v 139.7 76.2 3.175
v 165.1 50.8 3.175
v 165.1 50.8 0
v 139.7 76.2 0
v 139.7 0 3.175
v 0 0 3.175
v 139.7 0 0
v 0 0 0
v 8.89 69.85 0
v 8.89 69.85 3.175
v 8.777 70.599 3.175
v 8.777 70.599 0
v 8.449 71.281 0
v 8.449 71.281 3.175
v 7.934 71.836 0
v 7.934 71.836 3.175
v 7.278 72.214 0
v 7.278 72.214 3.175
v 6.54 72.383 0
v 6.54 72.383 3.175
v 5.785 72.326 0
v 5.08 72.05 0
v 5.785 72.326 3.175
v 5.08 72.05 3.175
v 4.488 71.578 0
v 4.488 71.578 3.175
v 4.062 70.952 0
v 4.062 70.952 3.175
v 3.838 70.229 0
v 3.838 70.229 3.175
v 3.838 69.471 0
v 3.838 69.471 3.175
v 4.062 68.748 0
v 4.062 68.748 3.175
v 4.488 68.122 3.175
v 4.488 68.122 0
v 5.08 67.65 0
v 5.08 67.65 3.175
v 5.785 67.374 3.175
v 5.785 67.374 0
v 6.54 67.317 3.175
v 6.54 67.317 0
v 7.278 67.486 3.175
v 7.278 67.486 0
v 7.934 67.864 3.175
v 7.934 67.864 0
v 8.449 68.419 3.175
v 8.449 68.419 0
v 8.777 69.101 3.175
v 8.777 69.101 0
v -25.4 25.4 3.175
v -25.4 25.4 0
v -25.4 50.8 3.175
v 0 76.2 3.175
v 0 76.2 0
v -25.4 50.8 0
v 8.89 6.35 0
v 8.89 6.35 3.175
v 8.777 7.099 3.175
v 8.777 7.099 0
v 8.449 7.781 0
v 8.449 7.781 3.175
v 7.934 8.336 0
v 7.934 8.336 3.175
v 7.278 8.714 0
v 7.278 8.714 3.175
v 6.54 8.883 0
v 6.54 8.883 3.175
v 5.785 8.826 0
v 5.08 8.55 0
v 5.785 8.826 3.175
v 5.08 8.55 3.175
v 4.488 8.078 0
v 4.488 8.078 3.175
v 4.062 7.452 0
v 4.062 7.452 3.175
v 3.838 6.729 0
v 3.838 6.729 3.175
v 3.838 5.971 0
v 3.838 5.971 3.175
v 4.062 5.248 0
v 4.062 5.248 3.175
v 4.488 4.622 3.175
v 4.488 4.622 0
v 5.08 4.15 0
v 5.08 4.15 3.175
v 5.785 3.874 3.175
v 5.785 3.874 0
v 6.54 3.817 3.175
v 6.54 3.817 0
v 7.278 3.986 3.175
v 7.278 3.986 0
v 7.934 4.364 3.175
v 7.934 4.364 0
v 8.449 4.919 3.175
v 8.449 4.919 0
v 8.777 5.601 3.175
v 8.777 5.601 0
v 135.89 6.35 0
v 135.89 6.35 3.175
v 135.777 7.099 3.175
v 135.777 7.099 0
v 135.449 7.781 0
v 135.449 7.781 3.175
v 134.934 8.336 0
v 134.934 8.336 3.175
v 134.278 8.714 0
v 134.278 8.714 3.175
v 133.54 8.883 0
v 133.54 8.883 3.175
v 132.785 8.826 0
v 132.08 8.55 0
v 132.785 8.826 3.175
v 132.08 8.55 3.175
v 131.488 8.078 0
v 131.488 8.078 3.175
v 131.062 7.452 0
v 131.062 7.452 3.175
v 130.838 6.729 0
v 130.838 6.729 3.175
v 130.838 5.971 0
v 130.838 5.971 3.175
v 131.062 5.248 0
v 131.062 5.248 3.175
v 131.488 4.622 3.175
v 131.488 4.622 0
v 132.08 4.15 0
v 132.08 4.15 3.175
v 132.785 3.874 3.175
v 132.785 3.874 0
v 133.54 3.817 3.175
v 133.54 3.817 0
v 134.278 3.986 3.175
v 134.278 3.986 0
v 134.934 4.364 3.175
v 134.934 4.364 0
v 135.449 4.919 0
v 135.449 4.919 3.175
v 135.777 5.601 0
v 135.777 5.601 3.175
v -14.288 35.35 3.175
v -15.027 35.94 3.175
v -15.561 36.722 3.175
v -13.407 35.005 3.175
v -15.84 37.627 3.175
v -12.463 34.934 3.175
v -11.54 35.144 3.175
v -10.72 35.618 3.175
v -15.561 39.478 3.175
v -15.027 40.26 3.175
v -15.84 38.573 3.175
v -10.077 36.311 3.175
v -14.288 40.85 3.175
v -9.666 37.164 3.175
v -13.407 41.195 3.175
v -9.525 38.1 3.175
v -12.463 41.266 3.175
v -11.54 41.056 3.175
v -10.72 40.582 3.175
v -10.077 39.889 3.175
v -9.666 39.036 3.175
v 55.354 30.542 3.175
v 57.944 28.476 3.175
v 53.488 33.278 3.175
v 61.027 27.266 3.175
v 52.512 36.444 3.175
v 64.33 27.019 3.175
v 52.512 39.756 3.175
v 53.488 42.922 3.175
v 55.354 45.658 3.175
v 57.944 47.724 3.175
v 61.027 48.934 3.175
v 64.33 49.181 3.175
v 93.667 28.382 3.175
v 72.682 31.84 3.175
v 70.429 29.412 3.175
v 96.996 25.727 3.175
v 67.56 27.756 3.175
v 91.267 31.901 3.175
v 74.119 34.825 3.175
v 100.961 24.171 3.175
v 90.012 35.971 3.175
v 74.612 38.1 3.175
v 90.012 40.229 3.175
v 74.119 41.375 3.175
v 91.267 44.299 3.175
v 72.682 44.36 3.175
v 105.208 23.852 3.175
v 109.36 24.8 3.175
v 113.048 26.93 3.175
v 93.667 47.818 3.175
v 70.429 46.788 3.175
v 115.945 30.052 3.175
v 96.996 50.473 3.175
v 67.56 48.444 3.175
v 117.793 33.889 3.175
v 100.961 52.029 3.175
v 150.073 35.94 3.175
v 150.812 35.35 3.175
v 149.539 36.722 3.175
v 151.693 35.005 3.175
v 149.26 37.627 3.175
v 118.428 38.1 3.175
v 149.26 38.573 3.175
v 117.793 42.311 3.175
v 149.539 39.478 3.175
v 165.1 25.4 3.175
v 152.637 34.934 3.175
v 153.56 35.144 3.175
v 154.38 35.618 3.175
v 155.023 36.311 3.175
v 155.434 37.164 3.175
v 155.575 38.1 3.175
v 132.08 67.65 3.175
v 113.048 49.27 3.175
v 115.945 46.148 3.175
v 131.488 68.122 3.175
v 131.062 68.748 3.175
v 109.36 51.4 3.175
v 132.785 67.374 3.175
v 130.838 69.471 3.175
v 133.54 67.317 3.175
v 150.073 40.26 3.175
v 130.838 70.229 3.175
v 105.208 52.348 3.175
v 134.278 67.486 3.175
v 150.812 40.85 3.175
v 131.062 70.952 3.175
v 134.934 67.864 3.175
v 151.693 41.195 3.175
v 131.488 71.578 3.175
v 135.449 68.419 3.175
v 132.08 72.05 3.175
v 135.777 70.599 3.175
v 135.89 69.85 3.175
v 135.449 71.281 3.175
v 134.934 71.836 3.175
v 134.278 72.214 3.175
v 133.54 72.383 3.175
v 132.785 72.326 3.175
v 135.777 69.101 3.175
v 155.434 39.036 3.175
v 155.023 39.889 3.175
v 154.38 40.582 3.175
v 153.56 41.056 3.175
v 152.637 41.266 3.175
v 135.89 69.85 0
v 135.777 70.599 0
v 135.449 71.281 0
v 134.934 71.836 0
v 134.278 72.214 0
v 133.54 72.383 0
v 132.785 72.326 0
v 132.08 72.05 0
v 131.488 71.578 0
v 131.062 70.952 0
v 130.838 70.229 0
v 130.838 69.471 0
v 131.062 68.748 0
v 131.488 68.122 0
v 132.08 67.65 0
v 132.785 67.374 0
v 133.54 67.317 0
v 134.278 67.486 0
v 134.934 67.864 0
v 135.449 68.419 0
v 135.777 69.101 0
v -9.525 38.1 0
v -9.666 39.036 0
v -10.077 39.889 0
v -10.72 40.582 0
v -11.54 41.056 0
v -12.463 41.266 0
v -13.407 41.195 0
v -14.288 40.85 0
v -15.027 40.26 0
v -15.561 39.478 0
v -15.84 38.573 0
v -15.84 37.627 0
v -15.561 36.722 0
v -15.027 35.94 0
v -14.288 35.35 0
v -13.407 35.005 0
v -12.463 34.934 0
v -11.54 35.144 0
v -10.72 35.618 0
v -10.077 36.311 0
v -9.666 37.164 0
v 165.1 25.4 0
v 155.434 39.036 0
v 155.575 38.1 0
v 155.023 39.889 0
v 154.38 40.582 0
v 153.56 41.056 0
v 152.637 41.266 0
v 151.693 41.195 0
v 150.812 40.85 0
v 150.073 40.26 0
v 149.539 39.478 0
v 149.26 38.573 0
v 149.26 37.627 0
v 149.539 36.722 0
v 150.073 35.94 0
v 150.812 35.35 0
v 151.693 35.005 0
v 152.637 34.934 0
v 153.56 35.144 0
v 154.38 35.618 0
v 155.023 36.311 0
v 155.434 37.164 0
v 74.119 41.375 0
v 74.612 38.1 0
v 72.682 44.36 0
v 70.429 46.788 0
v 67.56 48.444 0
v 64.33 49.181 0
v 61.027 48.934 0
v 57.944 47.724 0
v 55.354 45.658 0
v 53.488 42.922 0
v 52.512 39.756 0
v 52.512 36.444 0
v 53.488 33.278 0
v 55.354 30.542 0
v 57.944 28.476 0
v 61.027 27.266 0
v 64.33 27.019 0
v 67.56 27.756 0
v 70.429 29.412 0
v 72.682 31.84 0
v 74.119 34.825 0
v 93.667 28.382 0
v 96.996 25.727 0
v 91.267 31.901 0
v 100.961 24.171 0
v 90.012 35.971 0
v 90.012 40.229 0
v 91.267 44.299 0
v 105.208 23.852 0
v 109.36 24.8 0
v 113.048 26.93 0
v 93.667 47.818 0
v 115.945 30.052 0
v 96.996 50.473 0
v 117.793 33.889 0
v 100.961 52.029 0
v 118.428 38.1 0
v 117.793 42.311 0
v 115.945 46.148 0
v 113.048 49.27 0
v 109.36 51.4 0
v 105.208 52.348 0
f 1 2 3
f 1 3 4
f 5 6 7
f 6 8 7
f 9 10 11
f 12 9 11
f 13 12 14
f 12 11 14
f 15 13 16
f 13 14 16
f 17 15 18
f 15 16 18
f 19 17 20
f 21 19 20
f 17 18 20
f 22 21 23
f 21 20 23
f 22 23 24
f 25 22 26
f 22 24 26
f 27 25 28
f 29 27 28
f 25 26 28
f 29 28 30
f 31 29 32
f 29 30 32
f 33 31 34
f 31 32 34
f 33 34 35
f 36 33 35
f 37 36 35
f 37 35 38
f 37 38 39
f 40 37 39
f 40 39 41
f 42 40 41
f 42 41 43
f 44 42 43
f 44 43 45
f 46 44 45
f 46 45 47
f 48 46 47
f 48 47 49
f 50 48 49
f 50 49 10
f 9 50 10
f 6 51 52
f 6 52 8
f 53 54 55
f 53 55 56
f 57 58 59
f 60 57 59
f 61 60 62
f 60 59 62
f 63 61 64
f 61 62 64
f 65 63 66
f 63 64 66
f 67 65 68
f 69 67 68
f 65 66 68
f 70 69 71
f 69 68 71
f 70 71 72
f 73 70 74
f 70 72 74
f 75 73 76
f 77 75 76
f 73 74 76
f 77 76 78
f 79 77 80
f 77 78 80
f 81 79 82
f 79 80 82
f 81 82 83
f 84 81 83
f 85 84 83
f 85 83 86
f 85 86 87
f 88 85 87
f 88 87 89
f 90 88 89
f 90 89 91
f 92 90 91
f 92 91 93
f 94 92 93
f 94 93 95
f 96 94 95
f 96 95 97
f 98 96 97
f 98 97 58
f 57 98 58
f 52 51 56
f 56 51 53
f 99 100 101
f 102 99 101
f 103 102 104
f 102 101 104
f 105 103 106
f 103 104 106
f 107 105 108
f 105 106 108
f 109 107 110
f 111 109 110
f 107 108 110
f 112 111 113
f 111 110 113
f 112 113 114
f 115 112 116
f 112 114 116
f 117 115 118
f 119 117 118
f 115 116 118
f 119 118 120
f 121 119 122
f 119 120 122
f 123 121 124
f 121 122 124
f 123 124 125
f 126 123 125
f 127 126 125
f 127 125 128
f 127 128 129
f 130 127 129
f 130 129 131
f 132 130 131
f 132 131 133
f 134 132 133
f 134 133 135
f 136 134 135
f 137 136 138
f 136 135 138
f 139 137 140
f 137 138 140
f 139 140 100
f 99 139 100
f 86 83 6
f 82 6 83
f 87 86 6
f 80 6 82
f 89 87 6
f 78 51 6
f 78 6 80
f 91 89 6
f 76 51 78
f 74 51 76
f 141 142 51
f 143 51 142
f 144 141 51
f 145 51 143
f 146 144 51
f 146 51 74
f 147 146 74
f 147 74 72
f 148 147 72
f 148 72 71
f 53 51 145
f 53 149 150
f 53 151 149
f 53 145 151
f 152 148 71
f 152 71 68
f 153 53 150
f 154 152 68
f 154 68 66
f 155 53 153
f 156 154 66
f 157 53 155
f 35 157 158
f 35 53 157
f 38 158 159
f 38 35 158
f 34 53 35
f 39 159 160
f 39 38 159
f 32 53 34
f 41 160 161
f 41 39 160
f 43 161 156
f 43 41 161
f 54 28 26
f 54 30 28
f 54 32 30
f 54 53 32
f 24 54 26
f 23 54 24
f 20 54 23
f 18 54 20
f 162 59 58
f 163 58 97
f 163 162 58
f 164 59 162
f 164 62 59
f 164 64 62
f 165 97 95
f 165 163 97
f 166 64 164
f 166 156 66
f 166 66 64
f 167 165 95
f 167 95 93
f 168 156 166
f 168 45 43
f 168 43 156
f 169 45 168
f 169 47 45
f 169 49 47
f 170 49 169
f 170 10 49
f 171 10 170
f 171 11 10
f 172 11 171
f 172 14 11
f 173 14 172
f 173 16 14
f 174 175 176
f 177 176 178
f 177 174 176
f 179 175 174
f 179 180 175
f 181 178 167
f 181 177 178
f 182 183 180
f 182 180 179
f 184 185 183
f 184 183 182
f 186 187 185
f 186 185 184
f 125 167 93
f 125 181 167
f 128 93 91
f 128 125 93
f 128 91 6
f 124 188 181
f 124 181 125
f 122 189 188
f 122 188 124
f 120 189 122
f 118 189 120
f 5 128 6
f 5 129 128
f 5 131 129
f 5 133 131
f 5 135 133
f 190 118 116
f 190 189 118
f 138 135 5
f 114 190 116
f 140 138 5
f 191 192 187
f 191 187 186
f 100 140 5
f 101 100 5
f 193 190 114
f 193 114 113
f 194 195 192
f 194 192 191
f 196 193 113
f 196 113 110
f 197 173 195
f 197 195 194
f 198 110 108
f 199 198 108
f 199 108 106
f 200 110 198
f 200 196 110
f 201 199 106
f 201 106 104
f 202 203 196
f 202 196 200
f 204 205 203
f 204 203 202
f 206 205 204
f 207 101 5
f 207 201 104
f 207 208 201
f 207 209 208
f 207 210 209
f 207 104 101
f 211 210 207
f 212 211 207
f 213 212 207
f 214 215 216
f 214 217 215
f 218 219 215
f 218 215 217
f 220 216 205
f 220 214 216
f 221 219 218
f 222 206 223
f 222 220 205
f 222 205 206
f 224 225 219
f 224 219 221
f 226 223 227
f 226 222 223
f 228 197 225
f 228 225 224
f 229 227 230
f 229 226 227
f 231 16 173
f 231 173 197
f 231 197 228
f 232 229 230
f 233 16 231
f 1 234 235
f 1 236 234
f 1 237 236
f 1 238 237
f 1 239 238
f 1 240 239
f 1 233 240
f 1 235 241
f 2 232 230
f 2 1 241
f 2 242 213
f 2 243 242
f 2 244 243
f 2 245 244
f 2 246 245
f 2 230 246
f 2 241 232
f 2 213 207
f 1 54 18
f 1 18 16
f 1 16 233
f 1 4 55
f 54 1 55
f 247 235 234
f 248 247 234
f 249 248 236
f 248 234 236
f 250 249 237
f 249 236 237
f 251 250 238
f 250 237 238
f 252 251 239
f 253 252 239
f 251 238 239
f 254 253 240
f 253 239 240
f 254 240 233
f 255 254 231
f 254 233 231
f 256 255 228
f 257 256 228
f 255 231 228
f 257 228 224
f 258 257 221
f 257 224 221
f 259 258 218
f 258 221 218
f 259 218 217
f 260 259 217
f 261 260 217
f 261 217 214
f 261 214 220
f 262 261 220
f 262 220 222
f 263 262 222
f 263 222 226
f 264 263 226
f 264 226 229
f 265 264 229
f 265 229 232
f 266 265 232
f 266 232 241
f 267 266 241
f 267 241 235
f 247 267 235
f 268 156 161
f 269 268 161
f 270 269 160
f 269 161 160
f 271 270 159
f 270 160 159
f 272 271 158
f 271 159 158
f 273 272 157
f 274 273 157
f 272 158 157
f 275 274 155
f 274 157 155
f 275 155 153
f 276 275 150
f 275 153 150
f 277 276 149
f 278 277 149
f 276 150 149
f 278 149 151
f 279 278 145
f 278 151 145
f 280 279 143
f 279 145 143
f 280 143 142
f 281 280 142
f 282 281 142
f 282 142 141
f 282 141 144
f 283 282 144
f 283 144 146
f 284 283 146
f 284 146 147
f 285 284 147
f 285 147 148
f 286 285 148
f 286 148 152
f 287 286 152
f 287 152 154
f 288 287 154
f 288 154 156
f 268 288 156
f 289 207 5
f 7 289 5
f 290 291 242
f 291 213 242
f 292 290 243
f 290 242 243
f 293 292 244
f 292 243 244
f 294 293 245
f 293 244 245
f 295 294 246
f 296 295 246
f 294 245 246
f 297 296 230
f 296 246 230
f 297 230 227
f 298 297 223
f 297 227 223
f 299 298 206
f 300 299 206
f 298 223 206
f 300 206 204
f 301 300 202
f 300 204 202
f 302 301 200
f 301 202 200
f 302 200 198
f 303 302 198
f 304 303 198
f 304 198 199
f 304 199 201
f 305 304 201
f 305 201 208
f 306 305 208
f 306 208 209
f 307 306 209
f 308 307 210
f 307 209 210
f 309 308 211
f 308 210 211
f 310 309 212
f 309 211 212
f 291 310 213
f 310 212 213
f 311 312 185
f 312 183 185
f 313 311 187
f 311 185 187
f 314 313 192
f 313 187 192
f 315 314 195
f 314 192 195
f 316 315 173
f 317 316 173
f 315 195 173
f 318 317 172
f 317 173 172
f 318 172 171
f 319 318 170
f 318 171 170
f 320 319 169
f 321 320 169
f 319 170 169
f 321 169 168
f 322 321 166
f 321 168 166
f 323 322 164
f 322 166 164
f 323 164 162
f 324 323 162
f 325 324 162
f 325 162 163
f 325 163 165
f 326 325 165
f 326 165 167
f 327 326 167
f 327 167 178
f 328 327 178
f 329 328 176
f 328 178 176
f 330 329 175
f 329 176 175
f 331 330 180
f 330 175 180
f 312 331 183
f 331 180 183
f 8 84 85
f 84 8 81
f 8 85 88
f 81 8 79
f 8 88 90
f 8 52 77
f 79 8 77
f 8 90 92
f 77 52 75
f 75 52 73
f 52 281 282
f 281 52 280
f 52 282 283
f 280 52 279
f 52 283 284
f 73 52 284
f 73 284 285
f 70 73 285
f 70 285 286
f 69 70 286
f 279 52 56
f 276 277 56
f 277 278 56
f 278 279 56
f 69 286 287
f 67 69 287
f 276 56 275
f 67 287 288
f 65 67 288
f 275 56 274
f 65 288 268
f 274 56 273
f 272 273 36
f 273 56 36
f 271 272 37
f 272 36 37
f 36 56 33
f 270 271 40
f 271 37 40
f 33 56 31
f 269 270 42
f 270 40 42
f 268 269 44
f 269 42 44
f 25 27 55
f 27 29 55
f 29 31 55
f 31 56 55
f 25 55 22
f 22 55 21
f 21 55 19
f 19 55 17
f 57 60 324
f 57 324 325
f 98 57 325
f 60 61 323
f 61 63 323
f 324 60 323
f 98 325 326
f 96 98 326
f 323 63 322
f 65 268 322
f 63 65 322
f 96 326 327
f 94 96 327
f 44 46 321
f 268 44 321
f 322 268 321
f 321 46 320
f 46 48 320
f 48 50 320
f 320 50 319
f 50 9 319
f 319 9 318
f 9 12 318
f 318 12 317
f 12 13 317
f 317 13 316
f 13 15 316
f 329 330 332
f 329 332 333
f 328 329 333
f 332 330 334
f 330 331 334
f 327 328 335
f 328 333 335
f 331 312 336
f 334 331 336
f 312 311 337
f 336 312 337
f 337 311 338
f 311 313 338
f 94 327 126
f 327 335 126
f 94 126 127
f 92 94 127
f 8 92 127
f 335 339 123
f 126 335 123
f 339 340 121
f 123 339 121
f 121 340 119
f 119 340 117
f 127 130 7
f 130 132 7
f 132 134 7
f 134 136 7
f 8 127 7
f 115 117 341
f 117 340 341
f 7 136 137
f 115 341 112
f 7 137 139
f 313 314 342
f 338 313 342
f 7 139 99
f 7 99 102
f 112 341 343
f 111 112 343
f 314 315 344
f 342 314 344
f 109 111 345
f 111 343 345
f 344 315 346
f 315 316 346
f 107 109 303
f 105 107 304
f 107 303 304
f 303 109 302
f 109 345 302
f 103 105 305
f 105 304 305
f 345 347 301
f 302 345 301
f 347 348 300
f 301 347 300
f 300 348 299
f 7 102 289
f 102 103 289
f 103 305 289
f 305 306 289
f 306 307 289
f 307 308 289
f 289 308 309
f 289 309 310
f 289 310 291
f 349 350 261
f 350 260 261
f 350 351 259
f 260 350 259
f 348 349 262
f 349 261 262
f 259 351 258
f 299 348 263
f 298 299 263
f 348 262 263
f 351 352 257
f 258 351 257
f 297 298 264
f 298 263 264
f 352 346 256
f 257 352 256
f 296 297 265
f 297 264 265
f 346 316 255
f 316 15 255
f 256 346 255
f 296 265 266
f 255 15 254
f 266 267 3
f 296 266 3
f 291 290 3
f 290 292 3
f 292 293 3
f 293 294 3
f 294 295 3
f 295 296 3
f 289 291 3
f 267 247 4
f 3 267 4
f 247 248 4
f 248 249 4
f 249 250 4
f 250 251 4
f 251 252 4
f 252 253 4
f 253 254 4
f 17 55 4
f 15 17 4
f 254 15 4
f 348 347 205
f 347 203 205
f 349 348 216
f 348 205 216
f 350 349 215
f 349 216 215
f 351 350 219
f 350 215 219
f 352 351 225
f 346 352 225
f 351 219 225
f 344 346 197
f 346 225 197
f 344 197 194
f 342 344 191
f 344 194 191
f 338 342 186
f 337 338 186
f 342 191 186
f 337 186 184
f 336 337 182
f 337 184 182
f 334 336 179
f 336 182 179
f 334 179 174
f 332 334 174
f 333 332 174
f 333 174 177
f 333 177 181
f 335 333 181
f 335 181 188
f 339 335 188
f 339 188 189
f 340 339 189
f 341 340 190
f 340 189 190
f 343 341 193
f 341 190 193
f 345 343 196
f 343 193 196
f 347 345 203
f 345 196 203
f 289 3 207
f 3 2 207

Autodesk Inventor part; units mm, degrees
ref_plane "YZ Plane" through (0, 0, 0) normal (1, 0, 0) x (0, 1, 0)
ref_plane "XZ Plane" through (0, 0, 0) normal (0, 1, 0) x (-1, 0, 0)
ref_plane "XY Plane" through (0, 0, 0) normal (0, 0, 1) x (1, 0, 0)
sketch "Sketch1" plane through (0, 0, 0) normal (0, 0, 1) x (1, 0, 0)
  line L0 (0, 0) -> (139.7, 0)
  line L1 (139.7, 0) -> (139.7, 76.2)
  line L2 (139.7, 76.2) -> (0, 76.2)
  line L3 (0, 76.2) -> (0, 0)
  dimension "d0" = 139.7
  dimension "d1" = 76.2
extrude "Extrusion1" add sketch "Sketch1" along normal blind 3.175
sketch "Sketch2" plane through (0, 0, 3.175) normal (0, 0, 1) x (1, 0, 0)
  line L0 (0, 0) -> (139.7, 0) projected
  line L1 (139.7, 0) -> (139.7, 76.2) projected
  line L2 (139.7, 76.2) -> (0, 76.2) projected
  line L3 (0, 76.2) -> (0, 0) projected
  circle A0 centre (6.35, 69.85) radius 2.54
  circle A1 centre (6.35, 6.35) radius 2.54
  circle A2 centre (133.35, 6.35) radius 2.54
  circle A3 centre (133.35, 69.85) radius 2.54
  circle A4 centre (63.5, 38.1) radius 11.1125
  circle A5 centre (104.14, 38.1) radius 14.2875
  dimension "d4" = 6.35
  dimension "d5" = 6.35
  dimension "d6" = 69.85
  dimension "d7" = 6.35
  dimension "d8" = 133.35
  dimension "d9" = 6.35
  dimension "d10" = 133.35
  dimension "d11" = 69.85
  dimension "d12" = 63.5
  dimension "d13" = 38.1
  dimension "d14" = 38.1
  dimension "d15" = 104.14
  dimension "d16" = 5.08
  dimension "d17" = 5.08
  dimension "d18" = 5.08
  dimension "d19" = 5.08
  dimension "d20" = 22.225
  dimension "d21" = 28.575
extrude "Extrusion2" cut sketch "Sketch2" against normal blind 3.175 contours A0 | A1 | A2 | A3 | A4 | A5
sketch "Sketch3" plane through (0, 0, 3.175) normal (0, 0, 1) x (1, 0, 0)
  circle A0 centre (63.5, 38.1) radius 11.1125 projected
  circle A1 centre (133.35, 6.35) radius 2.54 projected
  circle A2 centre (6.35, 69.85) radius 2.54 projected
  circle A3 centre (6.35, 6.35) radius 2.54 projected
  circle A4 centre (133.35, 69.85) radius 2.54 projected
  circle A5 centre (104.14, 38.1) radius 14.2875 projected
  line L0 (0, 0) -> (139.7, 0) projected
  line L1 (139.7, 0) -> (139.7, 76.2) projected
  line L2 (139.7, 76.2) -> (0, 76.2) projected
  line L3 (0, 76.2) -> (0, 0) projected
  line L4 (0, 76.2) -> (0, 0) projected
  line L5 (0, 25.4) -> (-25.4, 25.4)
  line L6 (-25.4, 25.4) -> (-25.4, 50.8)
  line L7 (-25.4, 50.8) -> (0, 50.8)
  line L8 (0, 50.8) -> (0, 25.4)
  line L9 (0, 76.2) -> (-25.4, 50.8)
  line L10 (-25.4, 25.4) -> (0, 0)
  line L11 (139.7, 0) -> (139.7, 76.2) projected
  line L12 (139.7, 50.8) -> (165.1, 50.8)
  line L13 (165.1, 50.8) -> (165.1, 25.4)
  line L14 (165.1, 25.4) -> (139.7, 25.4)
  line L15 (139.7, 25.4) -> (139.7, 50.8)
  line L16 (0, 76.2) -> (0, 50.8)
  line L17 (0, 0) -> (0, 25.4)
  line L18 (139.7, 76.2) -> (139.7, 50.8)
  line L19 (165.1, 50.8) -> (139.7, 76.2)
  line L20 (165.1, 25.4) -> (139.7, 0)
  line L21 (139.7, 0) -> (139.7, 25.4)
  dimension "d24" = 25.4
  dimension "d25" = 25.4
  dimension "d26" = 25.4
  dimension "d27" = 25.4
  dimension "d28" = 25.4
  dimension "d29" = 25.4
extrude "Extrusion3" add sketch "Sketch3" against normal blind 3.175 contours L10 L5 L3 | L1 L14 L20 | L5 L6 L7 L3 | L1 L12 L13 L14 | L7 L9 L3 | L1 L19 L12
sketch "Sketch4" plane through (0, 0, 3.175) normal (0, 0, 1) x (1, 0, 0)
  circle A0 centre (63.5, 38.1) radius 11.1125 projected
  circle A1 centre (133.35, 6.35) radius 2.54 projected
  circle A2 centre (6.35, 69.85) radius 2.54 projected
  circle A3 centre (6.35, 6.35) radius 2.54 projected
  circle A4 centre (133.35, 69.85) radius 2.54 projected
  circle A5 centre (104.14, 38.1) radius 14.2875 projected
  line L0 (0, 0) -> (139.7, 0) projected
  line L1 (139.7, 0) -> (165.1, 25.4) projected
  line L2 (165.1, 25.4) -> (165.1, 50.8) projected
  line L3 (165.1, 50.8) -> (139.7, 76.2) projected
  line L4 (139.7, 76.2) -> (0, 76.2) projected
  line L5 (0, 76.2) -> (-25.4, 50.8) projected
  line L6 (-25.4, 50.8) -> (-25.4, 25.4) projected
  line L7 (-25.4, 25.4) -> (0, 0) projected
  circle A6 centre (-12.7, 38.1) radius 3.175
  circle A7 centre (152.4, 38.1) radius 3.175
  dimension "d32" = 6.35
  dimension "d33" = 12.7
  dimension "d34" = 38.1
  dimension "d35" = 6.35
  dimension "d36" = 152.4
  dimension "d37" = 38.1
extrude "Extrusion4" cut sketch "Sketch4" against normal blind 3.175 contours A6 | A7
properties part number "ToughBox Nano AM14U2 Mount" material "Aluminum 6061"
